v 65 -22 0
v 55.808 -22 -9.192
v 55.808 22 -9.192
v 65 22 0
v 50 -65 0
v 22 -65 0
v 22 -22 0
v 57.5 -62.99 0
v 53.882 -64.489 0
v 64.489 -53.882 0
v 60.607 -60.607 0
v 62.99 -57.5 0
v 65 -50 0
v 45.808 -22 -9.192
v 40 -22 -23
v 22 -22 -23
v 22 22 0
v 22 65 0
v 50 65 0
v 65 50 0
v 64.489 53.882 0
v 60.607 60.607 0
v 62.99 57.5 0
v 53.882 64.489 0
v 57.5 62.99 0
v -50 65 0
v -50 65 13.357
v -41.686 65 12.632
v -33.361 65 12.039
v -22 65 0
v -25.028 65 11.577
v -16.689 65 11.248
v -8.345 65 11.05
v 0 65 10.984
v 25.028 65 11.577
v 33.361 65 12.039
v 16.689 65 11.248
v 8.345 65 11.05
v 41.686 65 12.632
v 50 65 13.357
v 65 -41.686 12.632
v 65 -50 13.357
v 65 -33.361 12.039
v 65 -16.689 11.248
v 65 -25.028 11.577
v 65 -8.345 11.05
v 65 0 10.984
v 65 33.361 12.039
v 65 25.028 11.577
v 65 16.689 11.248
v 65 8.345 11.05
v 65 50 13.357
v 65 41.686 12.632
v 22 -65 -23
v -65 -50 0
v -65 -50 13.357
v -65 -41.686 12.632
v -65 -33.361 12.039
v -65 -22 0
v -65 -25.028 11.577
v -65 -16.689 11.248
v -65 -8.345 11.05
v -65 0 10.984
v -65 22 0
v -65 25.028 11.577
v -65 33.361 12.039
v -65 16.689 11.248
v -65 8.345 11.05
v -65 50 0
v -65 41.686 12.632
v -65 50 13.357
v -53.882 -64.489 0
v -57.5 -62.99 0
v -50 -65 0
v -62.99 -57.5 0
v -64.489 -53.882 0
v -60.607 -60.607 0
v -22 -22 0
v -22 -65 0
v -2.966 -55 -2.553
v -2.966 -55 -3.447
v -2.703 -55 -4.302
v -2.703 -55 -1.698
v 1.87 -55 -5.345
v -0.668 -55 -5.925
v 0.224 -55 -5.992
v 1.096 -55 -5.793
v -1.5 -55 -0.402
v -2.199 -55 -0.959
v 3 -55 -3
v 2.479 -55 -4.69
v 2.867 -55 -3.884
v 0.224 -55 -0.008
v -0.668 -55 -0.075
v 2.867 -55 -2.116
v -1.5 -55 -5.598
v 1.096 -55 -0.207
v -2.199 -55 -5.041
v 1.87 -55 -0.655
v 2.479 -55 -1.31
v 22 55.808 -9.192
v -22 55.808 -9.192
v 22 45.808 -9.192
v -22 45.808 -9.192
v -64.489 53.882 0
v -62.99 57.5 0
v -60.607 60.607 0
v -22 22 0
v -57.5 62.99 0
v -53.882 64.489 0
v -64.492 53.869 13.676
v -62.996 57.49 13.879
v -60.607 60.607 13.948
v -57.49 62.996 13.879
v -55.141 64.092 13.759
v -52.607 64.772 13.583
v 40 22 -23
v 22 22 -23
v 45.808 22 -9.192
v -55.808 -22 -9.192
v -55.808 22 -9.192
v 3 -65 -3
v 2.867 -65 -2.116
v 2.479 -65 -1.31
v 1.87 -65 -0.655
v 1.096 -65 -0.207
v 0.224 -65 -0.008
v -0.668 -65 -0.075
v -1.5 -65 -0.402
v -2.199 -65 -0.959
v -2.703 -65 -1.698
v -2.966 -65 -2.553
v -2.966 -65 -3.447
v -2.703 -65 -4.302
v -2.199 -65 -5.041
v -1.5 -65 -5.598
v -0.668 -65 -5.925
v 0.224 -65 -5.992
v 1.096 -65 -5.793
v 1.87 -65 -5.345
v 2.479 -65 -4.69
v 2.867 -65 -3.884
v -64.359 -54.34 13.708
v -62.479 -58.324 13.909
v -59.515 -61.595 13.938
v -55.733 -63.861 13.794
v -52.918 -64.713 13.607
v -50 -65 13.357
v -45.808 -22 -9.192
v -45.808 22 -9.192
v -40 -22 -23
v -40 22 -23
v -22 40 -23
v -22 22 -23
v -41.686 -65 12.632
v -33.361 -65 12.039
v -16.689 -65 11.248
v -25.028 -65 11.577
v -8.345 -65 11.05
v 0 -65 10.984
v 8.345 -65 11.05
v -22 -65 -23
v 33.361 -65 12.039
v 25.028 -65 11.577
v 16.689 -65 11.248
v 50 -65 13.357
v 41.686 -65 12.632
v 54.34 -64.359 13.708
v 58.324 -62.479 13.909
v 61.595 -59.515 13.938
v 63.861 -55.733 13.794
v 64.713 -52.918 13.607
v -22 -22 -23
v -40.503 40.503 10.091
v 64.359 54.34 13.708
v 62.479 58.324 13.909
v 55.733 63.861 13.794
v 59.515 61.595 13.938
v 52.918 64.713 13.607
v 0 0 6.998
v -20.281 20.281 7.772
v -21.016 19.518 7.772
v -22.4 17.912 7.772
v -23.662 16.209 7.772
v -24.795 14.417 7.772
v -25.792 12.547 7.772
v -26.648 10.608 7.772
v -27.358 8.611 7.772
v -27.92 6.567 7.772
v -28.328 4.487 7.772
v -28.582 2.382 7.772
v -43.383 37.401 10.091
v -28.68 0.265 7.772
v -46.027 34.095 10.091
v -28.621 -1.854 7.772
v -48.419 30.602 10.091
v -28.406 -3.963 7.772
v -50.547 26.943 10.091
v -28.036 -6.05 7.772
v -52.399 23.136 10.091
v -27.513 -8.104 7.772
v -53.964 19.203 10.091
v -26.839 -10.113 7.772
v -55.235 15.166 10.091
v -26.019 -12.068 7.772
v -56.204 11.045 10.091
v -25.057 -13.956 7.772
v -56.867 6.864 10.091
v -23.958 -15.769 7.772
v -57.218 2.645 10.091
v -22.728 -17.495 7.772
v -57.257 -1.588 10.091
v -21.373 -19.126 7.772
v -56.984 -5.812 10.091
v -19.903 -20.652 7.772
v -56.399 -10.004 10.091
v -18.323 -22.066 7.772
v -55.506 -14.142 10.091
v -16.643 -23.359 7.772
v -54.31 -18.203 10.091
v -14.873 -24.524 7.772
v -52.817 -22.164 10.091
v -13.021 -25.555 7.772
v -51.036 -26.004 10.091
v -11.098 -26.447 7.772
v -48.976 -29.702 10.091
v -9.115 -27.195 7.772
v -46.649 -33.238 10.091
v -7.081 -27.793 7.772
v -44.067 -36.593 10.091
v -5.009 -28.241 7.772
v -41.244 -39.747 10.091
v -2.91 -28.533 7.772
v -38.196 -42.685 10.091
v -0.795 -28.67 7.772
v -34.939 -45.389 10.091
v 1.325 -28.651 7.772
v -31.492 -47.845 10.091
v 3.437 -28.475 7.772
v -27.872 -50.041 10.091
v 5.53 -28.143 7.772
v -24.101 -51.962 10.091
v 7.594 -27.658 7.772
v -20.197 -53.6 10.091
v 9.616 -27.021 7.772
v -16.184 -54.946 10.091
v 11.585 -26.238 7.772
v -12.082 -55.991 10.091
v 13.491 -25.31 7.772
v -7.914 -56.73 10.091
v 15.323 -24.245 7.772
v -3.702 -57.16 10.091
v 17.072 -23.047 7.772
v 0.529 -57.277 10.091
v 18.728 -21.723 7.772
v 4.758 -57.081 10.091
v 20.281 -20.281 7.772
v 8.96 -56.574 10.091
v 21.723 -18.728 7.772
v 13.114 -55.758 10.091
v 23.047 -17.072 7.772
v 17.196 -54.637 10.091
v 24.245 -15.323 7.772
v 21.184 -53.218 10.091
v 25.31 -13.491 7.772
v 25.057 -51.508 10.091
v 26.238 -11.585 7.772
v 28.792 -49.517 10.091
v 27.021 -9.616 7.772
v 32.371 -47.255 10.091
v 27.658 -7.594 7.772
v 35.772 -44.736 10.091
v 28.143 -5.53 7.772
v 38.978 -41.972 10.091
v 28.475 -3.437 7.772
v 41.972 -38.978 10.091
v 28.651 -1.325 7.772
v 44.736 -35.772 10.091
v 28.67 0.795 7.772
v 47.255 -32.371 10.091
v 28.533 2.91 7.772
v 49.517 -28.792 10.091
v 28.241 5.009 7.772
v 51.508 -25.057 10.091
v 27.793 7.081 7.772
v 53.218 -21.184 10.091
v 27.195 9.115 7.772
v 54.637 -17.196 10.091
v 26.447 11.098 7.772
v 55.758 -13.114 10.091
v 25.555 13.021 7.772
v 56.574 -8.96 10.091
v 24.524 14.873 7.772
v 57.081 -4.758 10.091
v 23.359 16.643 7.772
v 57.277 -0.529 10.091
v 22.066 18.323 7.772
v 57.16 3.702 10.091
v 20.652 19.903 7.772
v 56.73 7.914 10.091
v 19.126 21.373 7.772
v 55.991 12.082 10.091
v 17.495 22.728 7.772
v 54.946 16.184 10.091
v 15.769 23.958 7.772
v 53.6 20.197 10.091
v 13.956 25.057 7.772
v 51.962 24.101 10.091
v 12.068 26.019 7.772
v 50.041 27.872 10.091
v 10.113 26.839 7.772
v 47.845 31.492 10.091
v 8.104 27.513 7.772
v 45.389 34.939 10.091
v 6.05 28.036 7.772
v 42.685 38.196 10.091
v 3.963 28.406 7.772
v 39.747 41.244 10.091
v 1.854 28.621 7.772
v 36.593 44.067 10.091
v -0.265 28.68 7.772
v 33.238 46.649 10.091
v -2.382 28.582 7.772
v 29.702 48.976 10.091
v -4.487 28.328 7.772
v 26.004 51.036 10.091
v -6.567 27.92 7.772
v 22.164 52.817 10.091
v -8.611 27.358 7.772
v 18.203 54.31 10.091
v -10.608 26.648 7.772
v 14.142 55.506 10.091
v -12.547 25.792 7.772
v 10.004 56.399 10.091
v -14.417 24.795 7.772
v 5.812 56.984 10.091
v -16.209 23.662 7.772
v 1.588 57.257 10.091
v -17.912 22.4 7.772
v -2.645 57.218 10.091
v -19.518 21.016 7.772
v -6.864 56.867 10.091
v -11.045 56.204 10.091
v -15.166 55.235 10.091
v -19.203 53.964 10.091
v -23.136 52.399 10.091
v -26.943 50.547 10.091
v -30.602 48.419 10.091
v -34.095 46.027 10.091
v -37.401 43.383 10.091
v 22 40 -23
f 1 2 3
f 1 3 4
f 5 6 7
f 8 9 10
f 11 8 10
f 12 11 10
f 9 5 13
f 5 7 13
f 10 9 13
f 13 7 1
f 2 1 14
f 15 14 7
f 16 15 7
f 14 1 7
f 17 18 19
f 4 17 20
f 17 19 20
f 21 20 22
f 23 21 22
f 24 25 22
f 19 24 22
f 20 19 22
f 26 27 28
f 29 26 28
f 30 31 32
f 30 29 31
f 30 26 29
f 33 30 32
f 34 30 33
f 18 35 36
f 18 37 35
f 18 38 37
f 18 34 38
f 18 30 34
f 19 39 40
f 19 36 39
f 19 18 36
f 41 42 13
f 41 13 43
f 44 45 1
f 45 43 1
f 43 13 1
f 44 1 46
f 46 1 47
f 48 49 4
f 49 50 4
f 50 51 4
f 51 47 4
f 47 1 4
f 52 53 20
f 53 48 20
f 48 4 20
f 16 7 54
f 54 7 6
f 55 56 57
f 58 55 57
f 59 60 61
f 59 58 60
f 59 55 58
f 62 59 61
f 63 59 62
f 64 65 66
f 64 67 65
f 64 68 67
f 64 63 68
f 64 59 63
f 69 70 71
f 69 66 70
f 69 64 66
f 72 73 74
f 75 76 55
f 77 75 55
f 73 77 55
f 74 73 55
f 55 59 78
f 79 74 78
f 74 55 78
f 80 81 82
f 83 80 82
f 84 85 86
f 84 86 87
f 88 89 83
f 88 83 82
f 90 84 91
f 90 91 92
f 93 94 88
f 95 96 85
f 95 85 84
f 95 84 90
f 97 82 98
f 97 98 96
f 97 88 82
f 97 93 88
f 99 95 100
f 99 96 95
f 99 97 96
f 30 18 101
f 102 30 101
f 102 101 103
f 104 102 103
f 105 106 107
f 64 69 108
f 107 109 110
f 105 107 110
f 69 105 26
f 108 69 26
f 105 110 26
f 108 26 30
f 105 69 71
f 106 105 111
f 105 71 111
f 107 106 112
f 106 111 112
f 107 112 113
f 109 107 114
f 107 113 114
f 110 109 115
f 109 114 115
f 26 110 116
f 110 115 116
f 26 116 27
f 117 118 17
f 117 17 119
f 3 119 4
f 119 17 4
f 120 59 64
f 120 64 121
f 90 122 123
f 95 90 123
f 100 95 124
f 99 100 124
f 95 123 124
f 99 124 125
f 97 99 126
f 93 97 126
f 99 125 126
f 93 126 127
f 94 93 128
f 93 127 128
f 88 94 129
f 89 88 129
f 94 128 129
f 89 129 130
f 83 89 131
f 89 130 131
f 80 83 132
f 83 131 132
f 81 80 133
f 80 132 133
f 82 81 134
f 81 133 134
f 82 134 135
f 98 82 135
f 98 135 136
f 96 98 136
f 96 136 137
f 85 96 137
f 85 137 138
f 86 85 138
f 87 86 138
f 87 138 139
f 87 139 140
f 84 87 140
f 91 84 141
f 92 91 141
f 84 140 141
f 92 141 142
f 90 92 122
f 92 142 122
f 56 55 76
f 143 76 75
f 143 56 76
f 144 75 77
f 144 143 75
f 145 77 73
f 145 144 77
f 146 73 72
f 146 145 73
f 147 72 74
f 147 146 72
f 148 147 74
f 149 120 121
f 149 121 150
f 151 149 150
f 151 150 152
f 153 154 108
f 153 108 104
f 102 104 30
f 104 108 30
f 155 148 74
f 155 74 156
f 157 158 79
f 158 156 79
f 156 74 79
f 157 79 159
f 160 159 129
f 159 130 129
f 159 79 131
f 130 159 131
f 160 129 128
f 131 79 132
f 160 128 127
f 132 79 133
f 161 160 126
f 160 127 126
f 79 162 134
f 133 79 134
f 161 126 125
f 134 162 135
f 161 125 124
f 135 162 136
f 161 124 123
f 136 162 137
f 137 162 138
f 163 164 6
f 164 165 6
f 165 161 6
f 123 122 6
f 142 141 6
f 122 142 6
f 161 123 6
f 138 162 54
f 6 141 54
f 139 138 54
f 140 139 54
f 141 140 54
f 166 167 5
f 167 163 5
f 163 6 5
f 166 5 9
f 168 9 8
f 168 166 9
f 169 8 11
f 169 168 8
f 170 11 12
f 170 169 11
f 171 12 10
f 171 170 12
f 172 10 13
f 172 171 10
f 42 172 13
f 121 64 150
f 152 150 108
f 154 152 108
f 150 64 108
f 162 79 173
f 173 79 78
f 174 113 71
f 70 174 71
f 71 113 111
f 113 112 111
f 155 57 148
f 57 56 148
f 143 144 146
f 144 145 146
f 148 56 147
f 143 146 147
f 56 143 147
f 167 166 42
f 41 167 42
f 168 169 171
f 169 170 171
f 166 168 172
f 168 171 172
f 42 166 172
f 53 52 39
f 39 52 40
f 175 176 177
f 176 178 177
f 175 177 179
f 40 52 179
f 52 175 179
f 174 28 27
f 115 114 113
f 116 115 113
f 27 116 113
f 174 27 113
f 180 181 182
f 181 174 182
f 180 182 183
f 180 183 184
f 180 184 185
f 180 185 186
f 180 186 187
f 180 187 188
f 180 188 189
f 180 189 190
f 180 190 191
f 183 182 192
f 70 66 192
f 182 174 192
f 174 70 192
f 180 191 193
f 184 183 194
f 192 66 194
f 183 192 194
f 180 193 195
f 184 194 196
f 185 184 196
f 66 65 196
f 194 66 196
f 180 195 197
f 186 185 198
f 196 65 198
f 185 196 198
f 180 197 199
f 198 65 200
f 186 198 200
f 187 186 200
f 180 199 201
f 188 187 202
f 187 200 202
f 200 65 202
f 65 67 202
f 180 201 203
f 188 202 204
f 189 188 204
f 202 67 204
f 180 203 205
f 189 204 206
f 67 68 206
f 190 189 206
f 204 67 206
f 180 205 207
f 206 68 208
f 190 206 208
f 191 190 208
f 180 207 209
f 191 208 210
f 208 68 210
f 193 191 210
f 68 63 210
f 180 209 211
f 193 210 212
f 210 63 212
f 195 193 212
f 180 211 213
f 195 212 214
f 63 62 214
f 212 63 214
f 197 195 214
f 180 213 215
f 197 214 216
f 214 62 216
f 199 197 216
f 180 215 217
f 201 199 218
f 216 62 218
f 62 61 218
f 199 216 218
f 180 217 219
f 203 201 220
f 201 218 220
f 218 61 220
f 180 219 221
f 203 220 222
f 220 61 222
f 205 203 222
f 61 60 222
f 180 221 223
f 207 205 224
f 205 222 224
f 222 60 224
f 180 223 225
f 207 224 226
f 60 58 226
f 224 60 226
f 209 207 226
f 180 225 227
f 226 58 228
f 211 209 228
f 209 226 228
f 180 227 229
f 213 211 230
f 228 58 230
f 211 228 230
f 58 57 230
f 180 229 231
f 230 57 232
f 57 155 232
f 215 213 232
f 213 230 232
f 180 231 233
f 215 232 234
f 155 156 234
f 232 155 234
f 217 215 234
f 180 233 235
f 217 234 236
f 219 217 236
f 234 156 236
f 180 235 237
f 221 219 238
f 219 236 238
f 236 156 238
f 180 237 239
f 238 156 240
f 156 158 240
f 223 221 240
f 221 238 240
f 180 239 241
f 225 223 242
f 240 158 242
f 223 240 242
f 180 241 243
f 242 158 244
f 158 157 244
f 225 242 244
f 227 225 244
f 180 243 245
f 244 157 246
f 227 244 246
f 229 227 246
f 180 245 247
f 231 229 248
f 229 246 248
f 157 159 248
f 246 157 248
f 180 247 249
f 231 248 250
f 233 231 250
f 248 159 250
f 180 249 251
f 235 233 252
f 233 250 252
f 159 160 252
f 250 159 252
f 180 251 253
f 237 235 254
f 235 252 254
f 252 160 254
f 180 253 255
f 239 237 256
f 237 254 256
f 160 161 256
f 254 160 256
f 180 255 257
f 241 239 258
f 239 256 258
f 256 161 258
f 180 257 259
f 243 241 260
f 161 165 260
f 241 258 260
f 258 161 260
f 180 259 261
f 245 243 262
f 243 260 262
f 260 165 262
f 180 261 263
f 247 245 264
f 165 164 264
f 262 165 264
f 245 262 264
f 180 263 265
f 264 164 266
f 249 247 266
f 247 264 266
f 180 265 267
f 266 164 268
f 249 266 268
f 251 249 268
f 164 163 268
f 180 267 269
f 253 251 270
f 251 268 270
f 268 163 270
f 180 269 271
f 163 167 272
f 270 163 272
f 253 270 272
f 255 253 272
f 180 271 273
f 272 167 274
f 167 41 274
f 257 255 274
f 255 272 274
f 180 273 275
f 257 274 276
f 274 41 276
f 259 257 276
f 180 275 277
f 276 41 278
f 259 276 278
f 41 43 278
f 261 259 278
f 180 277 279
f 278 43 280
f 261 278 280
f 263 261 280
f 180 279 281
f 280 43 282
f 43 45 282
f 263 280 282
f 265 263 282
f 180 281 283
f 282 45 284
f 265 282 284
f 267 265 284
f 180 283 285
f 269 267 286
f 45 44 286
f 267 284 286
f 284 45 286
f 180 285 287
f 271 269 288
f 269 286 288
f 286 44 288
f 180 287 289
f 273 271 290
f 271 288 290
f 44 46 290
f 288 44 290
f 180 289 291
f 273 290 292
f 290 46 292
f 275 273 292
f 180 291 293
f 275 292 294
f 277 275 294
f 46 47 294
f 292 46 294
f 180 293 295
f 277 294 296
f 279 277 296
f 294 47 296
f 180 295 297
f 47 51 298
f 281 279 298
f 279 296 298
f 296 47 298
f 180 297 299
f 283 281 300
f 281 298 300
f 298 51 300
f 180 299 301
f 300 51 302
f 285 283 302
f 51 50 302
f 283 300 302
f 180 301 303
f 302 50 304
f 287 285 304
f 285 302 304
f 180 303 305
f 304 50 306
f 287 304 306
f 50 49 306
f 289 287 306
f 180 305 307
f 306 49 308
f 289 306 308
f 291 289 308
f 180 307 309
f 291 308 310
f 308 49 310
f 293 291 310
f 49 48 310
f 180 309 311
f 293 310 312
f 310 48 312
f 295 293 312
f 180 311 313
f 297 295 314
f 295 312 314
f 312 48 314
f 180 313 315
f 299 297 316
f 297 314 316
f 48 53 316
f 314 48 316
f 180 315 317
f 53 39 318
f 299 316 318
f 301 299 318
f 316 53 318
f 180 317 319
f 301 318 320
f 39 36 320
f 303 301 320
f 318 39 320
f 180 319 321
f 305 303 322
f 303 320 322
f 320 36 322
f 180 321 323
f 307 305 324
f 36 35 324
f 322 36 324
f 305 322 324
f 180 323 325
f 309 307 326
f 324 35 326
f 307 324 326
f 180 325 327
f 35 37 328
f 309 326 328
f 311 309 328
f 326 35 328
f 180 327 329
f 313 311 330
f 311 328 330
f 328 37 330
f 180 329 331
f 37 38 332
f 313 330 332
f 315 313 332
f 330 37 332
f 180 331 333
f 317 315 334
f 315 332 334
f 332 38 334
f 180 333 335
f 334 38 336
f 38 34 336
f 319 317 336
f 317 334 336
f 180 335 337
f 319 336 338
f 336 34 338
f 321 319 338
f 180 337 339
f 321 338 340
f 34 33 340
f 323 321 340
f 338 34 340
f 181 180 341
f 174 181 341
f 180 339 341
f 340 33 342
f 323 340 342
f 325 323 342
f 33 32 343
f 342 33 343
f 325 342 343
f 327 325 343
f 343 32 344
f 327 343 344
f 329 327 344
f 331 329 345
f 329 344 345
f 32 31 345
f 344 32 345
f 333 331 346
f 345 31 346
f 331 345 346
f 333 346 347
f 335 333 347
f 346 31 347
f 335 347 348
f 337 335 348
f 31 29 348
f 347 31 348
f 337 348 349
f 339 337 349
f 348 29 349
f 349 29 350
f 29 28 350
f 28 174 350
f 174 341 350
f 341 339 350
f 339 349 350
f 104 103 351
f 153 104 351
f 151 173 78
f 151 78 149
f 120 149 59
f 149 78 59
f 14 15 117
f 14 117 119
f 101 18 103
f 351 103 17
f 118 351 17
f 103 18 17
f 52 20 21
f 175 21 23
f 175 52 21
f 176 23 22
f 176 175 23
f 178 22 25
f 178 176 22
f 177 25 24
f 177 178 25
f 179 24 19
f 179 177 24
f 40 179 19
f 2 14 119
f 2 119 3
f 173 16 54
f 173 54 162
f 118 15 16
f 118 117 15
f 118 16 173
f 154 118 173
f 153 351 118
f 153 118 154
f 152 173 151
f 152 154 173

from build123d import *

# Parameters (mm, degrees)
SKETCH1_W           = 130
SKETCH1_H           = 130
BOSS_EXTRUDE1_DEPTH = 15
FILLET1_R           = 15
BOSS_EXTRUDE3_DEPTH = 20
BOSS_EXTRUDE4_DEPTH = 23
CUT_EXTRUDE1_DEPTH  = 50
CUT_EXTRUDE2_DEPTH  = 50
SKETCH10_R          = 3
CUT_EXTRUDE3_DEPTH  = 10


with BuildPart() as part:
    # Sketch1 → Boss-Extrude1 (new body)
    with BuildSketch(Plane.XY):
        Rectangle(SKETCH1_W, SKETCH1_H)
    extrude(amount=BOSS_EXTRUDE1_DEPTH)

    # Fillet1
    fillet1_edges = [part.edges().sort_by_distance(p)[0] for p in [
        (65, -65, 7.5),
        (-65, -65, 7.5),
        (-65, 65, 7.5),
        (65, 65, 7.5),
    ]]
    fillet(fillet1_edges, radius=FILLET1_R)

    # Sketch5 → Boss-Extrude3 (add)
    with BuildSketch(Plane.XY.offset(15)):
        Polygon((-65, 65), (65, -65), (70.504249196, -59.495750804), (-59.495750804, 70.504249196), align=None)
    extrude(amount=BOSS_EXTRUDE3_DEPTH)

    # Sketch6 → Cut-Revolve2 (revolve, cut)
    with BuildSketch(Plane(origin=(0, 0, 0), x_dir=(0, 0, 1), z_dir=(-0.707106781, -0.707106781, 0))):
        with BuildLine():
            Line((15, 91.923881554), (15, 99.514365428))
            Line((15, 99.514365428), (45.882557295, 99.514365428))
            Line((45.882557295, 99.514365428), (45.882557295, 91.923881554))
            Line((45.882557295, 91.923881554), (45.882557295, 0))
            Line((45.882557295, 0), (6.998120304, 0))
            ThreePointArc((6.998120304, 0), (9.00236559, 46.135750993), (15, 91.923881554))
        make_face()
    revolve(axis=Axis((0, 0, 45.882557295), (0, 0, 1)), mode=Mode.SUBTRACT)

    # Sketch7 → Boss-Extrude4 (add)
    with BuildSketch(Plane(origin=(0, 0, 0), x_dir=(-1, 0, 0), z_dir=(0, 0, -1))):
        Polygon((-22, -65), (22, -65), (22, -22), (65, -22), (65, 22), (22, 22), (22, 65), (-22, 65), (-22, 22), (-65, 22), (-65, -22), (-22, -22), align=None)
    extrude(amount=BOSS_EXTRUDE4_DEPTH)

    # Sketch8 → Cut-Extrude1 (cut)
    with BuildSketch(Plane.XZ.offset(22)):
        Polygon((-65, 0), (-55.807611845, -9.192388155), (-45.807611845, -9.192388155), (-40, -23), (0, -40.620002029), (40, -23), (45.807611845, -9.192388155), (55.807611845, -9.192388155), (65, 0), (68.211957708, -1.350979723), (68.682657398, -47.498818865), (-34.338090691, -46.266881669), (-70.140917764, -27.552380355), align=None)
    extrude(amount=-CUT_EXTRUDE1_DEPTH, mode=Mode.SUBTRACT)

    # Sketch9 → Cut-Extrude2 (cut)
    with BuildSketch(Plane(origin=(22, 0, 0), x_dir=(0, 0, -1), z_dir=(1, 0, 0))):
        Polygon((0, 65), (9.192388155, 55.807611845), (9.192388155, 45.807611845), (23, 40), (23, 65), align=None)
    extrude(amount=-CUT_EXTRUDE2_DEPTH, mode=Mode.SUBTRACT)

    # Sketch10 → Cut-Extrude3 (cut)
    with BuildSketch(Plane.XZ.offset(65)):
        with Locations((0, -3)):
            Circle(SKETCH10_R)
    extrude(amount=-CUT_EXTRUDE3_DEPTH, mode=Mode.SUBTRACT)


solid = part.part
